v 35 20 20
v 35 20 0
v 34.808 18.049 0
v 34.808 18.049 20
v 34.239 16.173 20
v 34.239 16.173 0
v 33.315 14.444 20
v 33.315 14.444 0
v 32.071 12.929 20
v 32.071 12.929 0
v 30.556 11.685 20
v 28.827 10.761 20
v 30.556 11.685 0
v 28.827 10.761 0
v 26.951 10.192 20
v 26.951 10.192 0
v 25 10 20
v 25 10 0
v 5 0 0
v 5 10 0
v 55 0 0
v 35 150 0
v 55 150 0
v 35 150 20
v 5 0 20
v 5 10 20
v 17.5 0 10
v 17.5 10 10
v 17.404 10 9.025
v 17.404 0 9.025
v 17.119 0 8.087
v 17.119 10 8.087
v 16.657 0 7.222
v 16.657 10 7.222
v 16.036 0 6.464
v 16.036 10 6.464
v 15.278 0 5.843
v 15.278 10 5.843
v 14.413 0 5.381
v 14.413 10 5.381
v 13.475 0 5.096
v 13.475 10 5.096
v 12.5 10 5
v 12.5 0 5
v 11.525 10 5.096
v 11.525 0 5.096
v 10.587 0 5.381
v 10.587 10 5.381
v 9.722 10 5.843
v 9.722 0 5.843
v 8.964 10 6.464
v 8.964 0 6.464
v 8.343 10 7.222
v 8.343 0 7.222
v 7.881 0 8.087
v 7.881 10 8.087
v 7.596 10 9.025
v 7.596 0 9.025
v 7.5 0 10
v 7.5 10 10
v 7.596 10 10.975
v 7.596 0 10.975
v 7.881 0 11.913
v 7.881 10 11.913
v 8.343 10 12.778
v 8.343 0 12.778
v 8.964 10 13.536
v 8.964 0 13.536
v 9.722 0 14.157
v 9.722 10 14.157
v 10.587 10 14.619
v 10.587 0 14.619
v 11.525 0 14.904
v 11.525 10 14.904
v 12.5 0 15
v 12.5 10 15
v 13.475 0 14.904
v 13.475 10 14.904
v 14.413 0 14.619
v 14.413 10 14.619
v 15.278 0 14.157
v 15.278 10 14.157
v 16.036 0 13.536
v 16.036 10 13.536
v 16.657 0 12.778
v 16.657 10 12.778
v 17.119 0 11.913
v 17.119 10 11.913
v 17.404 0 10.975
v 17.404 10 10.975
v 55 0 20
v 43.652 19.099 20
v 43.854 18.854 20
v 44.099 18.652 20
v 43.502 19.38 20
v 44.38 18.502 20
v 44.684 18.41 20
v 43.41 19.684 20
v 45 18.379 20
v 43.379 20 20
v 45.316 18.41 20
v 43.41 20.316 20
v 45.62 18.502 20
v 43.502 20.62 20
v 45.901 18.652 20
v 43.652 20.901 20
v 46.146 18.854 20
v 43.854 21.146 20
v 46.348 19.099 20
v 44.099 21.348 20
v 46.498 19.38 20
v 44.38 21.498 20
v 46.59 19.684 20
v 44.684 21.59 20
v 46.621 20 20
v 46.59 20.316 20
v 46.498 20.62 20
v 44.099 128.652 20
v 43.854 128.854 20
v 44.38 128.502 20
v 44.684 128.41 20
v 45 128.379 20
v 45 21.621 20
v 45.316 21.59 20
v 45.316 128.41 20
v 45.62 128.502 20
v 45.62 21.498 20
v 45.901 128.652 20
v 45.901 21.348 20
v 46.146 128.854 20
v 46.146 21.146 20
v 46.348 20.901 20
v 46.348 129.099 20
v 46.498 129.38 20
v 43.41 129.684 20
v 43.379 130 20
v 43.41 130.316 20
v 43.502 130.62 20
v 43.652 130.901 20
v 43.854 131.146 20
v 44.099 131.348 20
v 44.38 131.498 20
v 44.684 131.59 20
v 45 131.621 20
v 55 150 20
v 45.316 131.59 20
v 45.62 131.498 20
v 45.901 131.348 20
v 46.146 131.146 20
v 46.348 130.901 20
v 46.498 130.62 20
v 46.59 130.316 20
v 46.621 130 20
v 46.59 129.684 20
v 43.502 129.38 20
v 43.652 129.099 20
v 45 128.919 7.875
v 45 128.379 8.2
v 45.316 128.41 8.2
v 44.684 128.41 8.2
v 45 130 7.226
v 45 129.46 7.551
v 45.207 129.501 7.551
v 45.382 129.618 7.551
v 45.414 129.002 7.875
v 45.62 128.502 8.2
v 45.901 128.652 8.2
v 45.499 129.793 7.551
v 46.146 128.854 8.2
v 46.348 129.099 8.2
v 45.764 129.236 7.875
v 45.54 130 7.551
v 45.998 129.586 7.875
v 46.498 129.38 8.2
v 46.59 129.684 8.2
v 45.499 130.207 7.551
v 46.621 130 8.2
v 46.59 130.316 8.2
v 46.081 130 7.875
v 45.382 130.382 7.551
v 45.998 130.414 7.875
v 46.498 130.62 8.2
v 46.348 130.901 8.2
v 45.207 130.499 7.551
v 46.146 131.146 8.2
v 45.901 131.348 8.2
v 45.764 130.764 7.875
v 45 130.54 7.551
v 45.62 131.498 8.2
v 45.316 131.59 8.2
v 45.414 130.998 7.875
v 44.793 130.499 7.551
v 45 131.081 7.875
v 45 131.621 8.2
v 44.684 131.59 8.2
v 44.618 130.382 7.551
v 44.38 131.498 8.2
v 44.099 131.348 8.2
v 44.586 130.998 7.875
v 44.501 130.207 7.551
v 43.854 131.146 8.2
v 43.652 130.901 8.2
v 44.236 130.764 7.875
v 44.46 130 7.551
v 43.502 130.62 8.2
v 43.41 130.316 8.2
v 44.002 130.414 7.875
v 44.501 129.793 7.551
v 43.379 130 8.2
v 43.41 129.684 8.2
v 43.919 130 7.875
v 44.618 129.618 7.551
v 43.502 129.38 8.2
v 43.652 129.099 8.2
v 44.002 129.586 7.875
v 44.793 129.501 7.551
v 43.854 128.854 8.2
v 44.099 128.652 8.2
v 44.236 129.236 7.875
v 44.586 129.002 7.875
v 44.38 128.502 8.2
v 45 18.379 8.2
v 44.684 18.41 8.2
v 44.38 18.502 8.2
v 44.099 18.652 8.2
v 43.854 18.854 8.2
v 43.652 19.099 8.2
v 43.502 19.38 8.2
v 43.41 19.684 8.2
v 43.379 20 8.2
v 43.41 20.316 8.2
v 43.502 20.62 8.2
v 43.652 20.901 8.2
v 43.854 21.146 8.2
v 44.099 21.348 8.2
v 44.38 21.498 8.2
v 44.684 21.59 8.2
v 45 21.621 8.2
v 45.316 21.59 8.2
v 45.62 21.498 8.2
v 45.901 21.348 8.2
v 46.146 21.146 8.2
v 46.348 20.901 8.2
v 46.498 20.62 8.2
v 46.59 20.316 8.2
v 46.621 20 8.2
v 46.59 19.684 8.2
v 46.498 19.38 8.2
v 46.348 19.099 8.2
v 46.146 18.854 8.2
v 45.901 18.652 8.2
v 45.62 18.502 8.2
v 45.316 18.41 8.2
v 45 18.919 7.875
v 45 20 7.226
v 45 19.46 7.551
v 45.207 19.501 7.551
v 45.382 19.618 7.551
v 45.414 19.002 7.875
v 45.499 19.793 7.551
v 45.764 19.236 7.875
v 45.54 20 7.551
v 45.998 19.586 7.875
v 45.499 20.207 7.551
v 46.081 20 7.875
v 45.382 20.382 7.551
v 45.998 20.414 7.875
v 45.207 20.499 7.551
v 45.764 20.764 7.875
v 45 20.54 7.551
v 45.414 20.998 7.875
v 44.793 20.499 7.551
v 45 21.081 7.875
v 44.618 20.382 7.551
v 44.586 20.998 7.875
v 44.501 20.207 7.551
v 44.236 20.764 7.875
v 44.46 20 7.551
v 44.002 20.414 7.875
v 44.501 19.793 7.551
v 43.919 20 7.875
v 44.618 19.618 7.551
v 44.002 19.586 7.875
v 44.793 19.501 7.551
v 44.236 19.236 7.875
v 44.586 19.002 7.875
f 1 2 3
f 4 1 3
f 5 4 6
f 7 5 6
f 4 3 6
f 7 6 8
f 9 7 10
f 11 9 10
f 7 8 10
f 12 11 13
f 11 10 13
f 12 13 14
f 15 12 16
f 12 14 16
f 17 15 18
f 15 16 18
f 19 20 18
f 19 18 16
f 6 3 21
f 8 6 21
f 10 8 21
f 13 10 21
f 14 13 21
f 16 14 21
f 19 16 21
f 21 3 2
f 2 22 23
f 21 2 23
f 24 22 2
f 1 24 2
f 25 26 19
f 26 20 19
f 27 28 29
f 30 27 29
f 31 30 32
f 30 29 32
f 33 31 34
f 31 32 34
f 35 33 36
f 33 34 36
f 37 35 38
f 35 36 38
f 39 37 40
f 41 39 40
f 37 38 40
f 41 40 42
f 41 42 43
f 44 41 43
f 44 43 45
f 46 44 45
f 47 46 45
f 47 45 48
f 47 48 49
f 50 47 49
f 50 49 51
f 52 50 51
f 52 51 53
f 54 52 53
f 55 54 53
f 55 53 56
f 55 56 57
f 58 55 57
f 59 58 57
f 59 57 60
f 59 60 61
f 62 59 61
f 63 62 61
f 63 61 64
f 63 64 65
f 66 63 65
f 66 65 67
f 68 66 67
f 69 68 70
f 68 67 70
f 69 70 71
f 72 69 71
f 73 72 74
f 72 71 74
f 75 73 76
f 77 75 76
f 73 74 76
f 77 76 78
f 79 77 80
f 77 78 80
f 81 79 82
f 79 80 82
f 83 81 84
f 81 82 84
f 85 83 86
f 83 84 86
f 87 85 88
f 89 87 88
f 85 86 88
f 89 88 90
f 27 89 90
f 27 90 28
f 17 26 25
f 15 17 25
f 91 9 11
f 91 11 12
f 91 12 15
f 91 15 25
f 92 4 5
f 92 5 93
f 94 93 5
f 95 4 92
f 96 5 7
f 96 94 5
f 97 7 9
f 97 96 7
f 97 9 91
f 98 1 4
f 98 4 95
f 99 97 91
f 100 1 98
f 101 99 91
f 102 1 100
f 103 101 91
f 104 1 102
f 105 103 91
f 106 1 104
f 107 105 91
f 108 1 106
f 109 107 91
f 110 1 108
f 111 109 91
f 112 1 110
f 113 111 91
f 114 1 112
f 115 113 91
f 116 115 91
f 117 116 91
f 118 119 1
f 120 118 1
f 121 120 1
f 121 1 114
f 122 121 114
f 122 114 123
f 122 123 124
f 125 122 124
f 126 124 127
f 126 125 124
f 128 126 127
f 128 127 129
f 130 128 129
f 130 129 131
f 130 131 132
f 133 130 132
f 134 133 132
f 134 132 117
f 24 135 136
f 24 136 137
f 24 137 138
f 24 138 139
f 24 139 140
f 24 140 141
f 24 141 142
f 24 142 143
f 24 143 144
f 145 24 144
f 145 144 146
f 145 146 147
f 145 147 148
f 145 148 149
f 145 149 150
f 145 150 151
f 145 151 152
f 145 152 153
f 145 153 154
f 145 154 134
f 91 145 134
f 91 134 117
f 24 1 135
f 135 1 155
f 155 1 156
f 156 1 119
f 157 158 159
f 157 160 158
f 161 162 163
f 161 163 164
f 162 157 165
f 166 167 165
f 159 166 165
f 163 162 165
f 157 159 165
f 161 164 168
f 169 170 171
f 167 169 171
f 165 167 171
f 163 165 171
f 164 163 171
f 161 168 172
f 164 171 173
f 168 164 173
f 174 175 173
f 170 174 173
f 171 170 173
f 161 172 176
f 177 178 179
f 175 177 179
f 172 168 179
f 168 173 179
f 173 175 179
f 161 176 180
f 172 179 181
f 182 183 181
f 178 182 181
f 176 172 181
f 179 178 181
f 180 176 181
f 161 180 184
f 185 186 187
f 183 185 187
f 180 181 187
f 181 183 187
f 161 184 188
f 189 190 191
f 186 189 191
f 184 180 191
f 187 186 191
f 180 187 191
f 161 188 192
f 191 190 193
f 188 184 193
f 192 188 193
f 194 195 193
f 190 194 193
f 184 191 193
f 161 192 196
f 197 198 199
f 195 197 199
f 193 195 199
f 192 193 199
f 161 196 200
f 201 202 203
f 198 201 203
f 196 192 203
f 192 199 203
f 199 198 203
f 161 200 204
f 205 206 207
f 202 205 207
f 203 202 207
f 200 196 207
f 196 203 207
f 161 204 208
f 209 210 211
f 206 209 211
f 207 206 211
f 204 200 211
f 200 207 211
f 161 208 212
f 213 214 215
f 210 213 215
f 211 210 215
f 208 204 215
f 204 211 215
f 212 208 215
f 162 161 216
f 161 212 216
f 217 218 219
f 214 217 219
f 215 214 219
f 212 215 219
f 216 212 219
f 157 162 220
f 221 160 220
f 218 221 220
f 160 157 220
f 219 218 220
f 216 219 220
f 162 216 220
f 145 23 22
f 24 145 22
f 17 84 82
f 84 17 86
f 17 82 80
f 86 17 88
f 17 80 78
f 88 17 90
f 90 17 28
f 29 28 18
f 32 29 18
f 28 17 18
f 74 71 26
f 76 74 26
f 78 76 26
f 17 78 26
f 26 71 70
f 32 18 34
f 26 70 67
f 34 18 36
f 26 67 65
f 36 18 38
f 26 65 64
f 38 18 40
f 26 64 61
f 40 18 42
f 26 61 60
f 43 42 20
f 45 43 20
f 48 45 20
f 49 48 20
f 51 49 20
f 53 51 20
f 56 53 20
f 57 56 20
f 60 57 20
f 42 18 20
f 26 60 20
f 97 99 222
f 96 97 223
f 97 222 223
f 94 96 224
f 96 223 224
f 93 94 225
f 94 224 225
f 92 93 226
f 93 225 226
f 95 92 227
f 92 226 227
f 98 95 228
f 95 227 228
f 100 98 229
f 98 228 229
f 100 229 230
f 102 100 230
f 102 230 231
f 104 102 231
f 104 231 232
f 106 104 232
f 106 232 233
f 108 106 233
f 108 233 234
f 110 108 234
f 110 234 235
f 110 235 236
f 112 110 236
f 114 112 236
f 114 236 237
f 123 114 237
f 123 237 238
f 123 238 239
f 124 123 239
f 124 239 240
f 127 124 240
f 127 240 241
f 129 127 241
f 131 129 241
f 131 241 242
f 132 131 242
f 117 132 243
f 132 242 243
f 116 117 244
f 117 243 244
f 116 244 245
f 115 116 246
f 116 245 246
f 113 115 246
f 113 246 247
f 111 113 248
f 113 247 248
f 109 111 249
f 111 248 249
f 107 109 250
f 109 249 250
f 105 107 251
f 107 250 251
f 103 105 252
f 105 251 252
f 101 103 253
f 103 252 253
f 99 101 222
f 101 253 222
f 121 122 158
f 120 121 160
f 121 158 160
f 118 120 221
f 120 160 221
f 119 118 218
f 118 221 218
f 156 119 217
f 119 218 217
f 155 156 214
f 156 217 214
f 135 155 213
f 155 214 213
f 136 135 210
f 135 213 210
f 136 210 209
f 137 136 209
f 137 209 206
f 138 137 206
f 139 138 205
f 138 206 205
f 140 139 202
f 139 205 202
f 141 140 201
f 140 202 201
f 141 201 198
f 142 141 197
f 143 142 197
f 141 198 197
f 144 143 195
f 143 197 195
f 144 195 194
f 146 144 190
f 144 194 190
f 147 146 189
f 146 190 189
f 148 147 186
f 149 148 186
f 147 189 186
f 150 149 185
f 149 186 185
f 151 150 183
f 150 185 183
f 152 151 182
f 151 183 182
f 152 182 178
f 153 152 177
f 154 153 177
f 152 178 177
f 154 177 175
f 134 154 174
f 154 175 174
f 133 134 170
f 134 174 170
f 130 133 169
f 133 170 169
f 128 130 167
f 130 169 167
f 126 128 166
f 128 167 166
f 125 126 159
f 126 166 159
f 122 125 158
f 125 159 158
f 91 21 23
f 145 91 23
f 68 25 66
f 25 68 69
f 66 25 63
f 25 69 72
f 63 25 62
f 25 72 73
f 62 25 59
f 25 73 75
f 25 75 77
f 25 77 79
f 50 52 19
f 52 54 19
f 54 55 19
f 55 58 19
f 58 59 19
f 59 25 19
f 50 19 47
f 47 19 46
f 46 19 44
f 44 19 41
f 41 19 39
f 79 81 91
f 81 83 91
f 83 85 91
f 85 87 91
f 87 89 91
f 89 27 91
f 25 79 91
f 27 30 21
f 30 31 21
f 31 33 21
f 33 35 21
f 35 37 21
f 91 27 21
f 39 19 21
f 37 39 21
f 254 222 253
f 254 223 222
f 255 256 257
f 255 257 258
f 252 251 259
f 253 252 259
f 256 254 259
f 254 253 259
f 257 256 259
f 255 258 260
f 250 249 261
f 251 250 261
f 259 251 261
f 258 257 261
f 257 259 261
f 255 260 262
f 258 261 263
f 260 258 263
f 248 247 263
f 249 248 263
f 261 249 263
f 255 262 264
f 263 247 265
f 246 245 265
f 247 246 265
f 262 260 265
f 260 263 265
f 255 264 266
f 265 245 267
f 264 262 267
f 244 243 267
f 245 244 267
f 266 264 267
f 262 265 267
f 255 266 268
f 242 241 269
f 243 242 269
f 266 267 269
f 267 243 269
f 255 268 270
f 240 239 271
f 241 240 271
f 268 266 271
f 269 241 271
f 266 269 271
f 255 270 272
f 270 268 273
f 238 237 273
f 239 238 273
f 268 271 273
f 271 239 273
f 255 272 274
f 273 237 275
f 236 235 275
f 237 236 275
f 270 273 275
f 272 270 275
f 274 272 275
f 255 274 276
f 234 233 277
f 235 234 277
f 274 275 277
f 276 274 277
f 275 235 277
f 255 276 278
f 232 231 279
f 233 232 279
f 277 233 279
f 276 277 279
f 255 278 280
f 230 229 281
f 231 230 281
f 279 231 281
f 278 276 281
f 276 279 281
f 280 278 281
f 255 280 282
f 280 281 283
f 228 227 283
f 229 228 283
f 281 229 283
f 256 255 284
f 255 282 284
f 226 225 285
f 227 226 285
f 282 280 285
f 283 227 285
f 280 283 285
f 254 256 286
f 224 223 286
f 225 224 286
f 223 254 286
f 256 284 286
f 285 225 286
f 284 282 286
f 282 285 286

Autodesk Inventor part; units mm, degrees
ref_plane "YZ Plane" through (0, 0, 0) normal (1, 0, 0) x (0, 1, 0)
ref_plane "XZ Plane" through (0, 0, 0) normal (0, 1, 0) x (-1, 0, 0)
ref_plane "XY Plane" through (0, 0, 0) normal (0, 0, 1) x (1, 0, 0)
sketch "Bracket Tall" plane through (0, 0, 0) normal (0, 0, 1) x (1, 0, 0)
  line L0 (0, 0) -> (30, 0)
  line L1 (25, 10) -> (0, 10)
  line L2 (0, 10) -> (0, 0)
  line L3 (30, 0) -> (55, 0)
  line L4 (55, 0) -> (55, 150)
  line L5 (55, 150) -> (35, 150)
  line L6 (35, 150) -> (35, 20)
  arc A0 (25, 10) -> (35, 20) centre (25, 20) ccw
  point P0 (35, 10)
  dimension "d0" = 35
  dimension "d2" = 20
  dimension "d3" = 150
  dimension "d4" = 10
  dimension "d10" = 10
extrude "Extrusion1" add sketch "Bracket Tall" along normal blind 20
sketch "Clearance Hole (M6-8)" plane through (0, 10, 0) normal (0, 1, 0) x (1, 0, 0)
  circle A0 centre (12.5, -10) radius 5
  line L0 (0, 0) -> (0, -20) projected
  line L1 (25, 0) -> (25, -20) projected
  dimension "d7" = 10
extrude "Extrusion2" cut sketch "Clearance Hole (M6-8)" against normal through all
sketch "Sketch4" plane through (0, 0, 20) normal (0, 0, 1) x (1, 0, 0)
  circle A0 centre (45, 20) radius 1.621 projected
  circle A1 centre (45, 20) radius 1.621
  line L0 (45, 20) -> (45, 130)
  point P0 (0, 0)
  dimension "d34" = 110
hole "Hole2" at (45, 20, 20) at (45, 130, 20) direction (0, 0, -1) diameter 3.242 depth 11.8 tip angle 118 thread size "M4x0.7" class "6H" standard "ANSI Metric M Profile"
move faces "Move1" translate (5, 0, 0) faces at (0, 6.6667, 6.6667)
properties part number "Bracket_Tall2" material "Aluminum, Anodized Silver"
